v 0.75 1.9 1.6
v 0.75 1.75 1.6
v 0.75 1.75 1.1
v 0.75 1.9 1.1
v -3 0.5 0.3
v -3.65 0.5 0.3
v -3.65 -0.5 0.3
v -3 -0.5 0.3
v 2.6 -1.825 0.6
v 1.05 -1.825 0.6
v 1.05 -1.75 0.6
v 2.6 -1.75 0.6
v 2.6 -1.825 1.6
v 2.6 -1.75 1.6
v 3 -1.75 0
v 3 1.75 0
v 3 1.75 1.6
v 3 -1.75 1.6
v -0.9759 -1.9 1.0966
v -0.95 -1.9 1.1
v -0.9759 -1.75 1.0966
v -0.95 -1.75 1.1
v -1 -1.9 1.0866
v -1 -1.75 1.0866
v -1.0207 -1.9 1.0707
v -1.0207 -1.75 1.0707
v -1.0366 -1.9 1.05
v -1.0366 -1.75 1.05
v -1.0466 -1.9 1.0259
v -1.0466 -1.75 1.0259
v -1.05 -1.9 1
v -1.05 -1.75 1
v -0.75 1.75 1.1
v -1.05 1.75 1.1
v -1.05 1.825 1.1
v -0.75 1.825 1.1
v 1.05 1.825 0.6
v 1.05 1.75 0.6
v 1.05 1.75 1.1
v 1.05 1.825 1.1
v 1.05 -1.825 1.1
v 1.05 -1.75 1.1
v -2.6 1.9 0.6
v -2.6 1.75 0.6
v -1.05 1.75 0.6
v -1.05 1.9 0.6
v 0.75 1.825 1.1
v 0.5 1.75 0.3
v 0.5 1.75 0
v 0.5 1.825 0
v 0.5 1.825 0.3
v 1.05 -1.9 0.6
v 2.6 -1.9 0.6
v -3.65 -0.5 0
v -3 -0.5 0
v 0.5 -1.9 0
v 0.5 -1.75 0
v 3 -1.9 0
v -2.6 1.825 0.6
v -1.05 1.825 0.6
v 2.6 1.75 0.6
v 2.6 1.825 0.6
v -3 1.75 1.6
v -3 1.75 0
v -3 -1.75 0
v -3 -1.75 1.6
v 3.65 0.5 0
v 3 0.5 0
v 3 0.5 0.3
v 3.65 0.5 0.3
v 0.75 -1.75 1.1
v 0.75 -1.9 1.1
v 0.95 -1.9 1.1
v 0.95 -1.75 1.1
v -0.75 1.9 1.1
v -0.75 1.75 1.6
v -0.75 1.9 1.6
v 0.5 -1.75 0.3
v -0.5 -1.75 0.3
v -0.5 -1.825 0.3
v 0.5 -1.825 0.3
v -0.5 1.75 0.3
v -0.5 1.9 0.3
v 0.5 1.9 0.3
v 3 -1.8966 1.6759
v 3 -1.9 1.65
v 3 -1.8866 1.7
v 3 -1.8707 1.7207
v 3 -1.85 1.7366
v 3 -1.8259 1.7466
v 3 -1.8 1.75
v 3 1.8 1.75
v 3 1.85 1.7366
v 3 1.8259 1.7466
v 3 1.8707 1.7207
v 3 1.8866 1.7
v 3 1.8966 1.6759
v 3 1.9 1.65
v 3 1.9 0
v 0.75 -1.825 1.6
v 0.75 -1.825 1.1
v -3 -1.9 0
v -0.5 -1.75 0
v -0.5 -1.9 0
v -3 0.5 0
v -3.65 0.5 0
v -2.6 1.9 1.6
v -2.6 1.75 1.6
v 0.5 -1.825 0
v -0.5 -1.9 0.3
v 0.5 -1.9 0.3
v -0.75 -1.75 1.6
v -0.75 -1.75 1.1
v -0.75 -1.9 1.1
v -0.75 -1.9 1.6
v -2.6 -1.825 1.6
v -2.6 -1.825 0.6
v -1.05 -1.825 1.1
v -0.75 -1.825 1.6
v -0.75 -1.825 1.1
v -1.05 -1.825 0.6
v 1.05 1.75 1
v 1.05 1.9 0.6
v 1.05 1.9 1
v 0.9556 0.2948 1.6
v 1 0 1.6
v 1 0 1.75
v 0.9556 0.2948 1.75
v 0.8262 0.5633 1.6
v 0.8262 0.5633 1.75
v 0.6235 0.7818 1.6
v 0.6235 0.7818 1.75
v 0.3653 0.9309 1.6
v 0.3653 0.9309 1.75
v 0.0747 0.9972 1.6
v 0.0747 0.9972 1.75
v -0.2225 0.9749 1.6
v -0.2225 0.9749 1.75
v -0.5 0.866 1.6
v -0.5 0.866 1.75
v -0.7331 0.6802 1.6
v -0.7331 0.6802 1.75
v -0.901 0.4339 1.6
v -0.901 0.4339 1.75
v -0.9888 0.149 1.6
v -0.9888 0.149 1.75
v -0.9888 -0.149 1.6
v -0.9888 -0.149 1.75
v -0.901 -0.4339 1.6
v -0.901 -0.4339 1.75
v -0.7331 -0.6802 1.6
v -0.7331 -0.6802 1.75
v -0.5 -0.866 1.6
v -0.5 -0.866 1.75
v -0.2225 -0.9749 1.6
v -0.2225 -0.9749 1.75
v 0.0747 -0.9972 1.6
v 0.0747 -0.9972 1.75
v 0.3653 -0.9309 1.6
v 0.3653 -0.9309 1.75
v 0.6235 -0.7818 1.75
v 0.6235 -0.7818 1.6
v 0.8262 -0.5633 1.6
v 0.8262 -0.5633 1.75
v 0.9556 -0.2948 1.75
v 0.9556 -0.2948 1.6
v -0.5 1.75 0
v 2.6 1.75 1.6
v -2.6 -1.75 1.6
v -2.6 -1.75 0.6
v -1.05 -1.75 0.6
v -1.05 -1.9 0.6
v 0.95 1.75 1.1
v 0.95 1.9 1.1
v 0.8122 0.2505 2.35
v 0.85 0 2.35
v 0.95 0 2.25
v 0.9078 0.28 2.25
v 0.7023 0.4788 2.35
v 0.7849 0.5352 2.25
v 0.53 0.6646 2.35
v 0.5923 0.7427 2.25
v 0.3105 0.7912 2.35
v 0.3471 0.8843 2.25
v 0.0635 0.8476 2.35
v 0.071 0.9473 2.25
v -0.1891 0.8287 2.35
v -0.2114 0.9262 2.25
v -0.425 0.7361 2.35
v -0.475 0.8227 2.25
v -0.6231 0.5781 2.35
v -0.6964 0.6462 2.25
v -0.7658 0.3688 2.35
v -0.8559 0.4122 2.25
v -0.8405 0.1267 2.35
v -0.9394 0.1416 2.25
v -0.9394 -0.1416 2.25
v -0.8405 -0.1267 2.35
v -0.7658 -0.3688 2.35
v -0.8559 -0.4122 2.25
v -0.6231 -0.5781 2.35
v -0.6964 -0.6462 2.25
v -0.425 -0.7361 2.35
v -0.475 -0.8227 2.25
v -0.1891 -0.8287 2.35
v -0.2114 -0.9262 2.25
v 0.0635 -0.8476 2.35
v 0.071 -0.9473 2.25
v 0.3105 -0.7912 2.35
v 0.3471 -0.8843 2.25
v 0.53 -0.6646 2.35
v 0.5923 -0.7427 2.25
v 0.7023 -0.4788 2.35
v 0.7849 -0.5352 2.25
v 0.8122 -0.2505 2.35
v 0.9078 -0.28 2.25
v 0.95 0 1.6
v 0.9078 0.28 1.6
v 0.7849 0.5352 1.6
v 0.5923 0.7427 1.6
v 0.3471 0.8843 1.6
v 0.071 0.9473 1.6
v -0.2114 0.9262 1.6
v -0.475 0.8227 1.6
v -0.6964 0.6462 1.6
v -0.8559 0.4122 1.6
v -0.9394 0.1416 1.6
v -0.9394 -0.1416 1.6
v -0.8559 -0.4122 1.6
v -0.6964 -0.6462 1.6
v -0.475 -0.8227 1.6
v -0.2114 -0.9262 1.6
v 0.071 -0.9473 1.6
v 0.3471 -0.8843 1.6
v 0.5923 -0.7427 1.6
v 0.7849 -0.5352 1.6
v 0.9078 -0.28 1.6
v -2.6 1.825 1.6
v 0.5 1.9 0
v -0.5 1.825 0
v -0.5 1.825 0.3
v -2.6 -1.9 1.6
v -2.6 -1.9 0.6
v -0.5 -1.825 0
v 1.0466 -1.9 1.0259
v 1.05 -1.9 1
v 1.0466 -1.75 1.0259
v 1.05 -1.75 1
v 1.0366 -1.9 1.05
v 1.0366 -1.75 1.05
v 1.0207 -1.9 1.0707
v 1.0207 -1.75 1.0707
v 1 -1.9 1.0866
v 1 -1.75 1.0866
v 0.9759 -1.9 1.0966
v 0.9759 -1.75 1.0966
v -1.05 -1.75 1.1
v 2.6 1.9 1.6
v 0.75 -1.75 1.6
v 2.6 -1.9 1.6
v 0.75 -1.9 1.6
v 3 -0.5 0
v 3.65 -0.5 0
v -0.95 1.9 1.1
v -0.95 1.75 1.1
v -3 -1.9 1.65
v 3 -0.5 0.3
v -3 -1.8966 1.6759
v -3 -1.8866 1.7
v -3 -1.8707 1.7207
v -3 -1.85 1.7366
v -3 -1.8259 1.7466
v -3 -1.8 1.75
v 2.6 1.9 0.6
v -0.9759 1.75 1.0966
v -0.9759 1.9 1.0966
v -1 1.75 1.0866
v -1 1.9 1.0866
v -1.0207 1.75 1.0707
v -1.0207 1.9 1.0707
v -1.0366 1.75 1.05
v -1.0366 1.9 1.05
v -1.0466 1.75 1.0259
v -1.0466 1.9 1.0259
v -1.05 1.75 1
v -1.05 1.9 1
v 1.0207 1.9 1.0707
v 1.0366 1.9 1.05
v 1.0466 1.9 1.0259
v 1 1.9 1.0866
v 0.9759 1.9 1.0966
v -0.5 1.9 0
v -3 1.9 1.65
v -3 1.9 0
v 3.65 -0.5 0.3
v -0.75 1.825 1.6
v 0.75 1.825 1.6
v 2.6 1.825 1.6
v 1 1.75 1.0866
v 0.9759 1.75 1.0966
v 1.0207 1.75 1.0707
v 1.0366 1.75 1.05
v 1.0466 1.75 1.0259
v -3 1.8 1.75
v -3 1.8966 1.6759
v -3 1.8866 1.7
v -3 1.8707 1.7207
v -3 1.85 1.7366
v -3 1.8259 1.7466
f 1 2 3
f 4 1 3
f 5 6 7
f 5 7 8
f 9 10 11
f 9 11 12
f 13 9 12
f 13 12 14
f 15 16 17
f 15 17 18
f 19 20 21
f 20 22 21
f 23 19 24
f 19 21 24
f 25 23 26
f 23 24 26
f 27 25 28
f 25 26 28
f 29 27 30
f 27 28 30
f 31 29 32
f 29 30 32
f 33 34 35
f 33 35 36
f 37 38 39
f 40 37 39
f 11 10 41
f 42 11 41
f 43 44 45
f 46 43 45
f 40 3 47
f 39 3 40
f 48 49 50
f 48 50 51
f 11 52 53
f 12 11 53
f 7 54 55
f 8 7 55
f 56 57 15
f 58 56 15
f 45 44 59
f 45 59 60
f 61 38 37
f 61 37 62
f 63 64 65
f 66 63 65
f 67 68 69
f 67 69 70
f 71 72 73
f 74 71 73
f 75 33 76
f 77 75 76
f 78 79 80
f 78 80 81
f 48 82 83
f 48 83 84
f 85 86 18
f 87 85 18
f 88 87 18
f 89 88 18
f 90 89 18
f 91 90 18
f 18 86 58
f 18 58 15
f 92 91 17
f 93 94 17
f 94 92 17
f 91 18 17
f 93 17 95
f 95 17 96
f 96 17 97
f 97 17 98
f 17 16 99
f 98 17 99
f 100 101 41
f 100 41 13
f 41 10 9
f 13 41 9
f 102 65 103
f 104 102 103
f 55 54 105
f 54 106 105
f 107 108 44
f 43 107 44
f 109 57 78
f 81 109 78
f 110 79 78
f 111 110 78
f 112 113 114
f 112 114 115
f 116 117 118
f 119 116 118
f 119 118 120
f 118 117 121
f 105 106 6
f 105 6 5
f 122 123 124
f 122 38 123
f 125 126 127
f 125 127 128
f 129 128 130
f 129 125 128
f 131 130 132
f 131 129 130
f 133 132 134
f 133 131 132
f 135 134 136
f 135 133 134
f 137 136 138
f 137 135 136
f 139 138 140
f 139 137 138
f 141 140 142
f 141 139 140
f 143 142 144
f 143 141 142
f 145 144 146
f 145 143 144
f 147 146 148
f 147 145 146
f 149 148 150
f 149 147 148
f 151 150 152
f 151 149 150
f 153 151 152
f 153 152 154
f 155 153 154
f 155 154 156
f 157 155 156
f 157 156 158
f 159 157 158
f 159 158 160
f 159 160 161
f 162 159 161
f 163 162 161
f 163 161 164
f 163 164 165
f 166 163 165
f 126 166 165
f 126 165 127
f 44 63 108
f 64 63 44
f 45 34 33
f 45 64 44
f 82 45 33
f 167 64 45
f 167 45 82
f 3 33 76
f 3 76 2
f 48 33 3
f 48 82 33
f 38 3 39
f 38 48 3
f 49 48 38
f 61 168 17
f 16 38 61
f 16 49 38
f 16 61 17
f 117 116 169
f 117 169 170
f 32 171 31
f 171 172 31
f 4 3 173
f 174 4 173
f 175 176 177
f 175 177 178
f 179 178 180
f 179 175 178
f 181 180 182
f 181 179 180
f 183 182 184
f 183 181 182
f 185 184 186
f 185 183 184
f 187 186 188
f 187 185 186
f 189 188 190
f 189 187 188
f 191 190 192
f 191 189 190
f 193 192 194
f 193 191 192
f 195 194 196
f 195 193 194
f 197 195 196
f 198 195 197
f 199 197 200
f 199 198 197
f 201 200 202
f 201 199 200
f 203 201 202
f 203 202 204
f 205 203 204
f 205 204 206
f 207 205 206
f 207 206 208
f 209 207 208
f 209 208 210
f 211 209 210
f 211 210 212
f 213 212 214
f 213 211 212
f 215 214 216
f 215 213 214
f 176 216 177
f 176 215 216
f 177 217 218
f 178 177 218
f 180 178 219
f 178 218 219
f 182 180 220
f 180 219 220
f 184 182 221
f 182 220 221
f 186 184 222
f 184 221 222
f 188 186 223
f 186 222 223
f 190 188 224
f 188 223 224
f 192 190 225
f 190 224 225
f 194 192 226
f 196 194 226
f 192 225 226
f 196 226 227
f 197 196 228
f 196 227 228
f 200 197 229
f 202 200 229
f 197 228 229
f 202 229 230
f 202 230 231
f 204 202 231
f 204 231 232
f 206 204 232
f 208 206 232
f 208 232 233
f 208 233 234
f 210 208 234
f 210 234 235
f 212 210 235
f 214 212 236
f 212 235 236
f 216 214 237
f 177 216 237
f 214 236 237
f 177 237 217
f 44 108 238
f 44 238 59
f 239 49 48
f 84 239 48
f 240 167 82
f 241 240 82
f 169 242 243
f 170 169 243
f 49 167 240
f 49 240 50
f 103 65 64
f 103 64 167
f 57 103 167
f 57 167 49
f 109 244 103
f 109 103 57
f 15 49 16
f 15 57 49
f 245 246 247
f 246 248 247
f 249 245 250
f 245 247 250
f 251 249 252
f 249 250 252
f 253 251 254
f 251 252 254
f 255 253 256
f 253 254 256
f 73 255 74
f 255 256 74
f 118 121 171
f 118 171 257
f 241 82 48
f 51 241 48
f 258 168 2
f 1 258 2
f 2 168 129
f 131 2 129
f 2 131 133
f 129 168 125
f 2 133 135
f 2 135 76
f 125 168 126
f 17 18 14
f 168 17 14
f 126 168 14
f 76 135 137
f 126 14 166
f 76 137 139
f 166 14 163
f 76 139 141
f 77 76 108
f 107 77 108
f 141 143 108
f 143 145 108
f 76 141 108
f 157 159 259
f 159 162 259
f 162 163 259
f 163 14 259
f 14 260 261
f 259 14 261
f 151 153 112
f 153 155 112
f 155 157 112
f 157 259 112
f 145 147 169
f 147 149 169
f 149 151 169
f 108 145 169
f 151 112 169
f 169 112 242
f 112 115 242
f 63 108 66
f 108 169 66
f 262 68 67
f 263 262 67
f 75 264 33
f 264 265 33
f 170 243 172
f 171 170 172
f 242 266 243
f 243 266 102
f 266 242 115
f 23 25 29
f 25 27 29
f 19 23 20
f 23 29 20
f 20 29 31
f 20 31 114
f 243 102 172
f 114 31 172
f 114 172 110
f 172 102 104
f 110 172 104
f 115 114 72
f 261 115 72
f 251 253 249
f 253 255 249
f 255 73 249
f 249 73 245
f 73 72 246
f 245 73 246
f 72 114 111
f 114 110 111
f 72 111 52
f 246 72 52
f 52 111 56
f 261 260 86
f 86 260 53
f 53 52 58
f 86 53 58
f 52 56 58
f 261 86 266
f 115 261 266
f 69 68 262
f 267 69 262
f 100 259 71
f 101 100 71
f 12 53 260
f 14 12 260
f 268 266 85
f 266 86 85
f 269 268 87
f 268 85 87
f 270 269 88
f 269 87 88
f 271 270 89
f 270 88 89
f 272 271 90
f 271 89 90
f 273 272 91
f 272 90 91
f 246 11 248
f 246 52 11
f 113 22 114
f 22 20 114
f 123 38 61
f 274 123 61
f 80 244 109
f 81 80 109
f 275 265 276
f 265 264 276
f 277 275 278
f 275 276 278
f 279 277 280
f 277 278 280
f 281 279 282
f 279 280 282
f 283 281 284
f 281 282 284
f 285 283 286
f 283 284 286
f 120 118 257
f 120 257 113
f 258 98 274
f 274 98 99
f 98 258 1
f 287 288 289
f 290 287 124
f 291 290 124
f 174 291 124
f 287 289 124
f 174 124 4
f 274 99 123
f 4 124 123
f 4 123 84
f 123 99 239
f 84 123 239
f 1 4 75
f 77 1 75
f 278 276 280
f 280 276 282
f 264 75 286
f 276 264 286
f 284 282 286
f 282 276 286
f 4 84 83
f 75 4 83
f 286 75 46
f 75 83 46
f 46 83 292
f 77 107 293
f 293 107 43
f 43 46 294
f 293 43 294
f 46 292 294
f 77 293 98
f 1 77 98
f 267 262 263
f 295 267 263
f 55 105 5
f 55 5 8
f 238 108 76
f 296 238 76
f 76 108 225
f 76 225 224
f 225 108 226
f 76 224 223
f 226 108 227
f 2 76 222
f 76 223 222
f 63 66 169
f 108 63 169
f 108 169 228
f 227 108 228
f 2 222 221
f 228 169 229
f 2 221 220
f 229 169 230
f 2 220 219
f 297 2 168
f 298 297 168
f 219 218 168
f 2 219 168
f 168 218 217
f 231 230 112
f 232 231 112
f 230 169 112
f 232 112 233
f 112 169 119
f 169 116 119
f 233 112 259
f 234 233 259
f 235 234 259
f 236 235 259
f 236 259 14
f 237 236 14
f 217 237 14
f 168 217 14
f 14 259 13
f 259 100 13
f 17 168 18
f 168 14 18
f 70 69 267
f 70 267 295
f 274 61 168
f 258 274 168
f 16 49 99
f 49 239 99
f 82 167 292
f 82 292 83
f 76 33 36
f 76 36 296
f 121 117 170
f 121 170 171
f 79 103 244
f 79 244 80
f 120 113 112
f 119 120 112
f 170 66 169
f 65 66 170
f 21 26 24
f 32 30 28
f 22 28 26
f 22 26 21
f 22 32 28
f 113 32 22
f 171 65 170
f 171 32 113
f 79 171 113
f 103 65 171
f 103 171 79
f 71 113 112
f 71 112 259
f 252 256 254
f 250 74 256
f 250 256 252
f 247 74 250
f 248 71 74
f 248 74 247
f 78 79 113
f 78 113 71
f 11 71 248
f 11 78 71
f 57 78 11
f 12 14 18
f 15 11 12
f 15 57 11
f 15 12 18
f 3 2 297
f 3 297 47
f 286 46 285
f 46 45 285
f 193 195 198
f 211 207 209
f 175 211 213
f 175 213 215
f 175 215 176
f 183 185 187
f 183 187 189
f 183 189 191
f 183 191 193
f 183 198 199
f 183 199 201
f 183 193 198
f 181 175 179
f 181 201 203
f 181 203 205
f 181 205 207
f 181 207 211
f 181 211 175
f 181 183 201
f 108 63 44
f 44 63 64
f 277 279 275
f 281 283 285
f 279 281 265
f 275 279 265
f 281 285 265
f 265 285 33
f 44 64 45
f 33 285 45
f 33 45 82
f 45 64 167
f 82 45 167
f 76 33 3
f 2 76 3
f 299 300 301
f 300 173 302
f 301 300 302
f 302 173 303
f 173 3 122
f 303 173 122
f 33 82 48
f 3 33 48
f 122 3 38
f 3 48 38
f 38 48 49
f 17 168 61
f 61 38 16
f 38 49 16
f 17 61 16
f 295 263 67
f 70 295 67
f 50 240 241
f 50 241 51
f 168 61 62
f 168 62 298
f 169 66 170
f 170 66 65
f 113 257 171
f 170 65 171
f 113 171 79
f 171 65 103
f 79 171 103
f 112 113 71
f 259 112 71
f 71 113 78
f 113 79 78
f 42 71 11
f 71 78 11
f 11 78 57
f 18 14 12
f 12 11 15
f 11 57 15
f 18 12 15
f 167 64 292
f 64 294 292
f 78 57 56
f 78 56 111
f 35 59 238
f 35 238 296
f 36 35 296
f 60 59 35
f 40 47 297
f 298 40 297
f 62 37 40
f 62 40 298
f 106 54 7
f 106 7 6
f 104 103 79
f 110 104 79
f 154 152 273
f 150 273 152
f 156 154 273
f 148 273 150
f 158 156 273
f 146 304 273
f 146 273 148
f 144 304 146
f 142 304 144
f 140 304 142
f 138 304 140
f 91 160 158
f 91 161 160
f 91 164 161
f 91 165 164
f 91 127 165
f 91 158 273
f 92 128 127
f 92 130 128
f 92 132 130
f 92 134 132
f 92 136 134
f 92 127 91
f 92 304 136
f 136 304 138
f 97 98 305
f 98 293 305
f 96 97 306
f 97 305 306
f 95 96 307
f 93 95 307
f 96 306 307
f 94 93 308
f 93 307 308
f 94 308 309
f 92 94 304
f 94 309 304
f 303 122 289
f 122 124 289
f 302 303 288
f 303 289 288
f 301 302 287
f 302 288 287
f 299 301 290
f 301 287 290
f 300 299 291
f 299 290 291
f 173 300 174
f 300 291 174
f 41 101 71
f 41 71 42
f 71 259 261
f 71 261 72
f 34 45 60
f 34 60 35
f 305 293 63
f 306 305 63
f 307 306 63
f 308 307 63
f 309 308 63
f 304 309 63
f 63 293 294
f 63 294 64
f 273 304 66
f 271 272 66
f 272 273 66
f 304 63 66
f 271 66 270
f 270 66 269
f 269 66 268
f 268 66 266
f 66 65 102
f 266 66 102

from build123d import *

# Parameters (mm, degrees)
F0_R          = 1
F1_DEPTH      = 1.75
F0_W          = 0.65
F0_H          = 1
F2_DEPTH      = 0.3
F3_W          = 1.55
F3_H          = 0.5
F3_W_2        = 1
F3_H_2        = 0.3
F4_DEPTH      = 1.901
F4_DEPTH_BACK = 1.901
F5_W          = 6
F5_H          = 3.5
F6_DEPTH      = 1.6
F7_W          = 6
F7_H          = 3.65
F8_DEPTH      = 1.6
F10_R         = 0.95
F11_DEPTH     = 0.75
F12_R         = 0.1
F13_SIZE      = 0.1


with BuildPart() as f1:
    # F0 (on Top) → F1 (new body)
    with BuildSketch(Plane.XY):
        Polygon((3, 1.9), (-3, 1.9), (-3, 0.5), (-3, -0.5), (-3, -1.9), (3, -1.9), (3, -0.5), (3, 0.5), align=None)
        Circle(F0_R, mode=Mode.SUBTRACT)
    extrude(amount=F1_DEPTH)

    # F0 (on Top) → F2 (join)
    with BuildSketch(Plane.XY):
        with Locations((-3.325, 0)):
            Rectangle(F0_W, F0_H)
        with Locations((3.325, 0)):
            Rectangle(F0_W, F0_H)
    extrude(amount=F2_DEPTH)

    # F3 (on Front) → F4 (cut, two sides)
    with BuildSketch(Plane.XZ) as f4_sk:
        Polygon((-0.75, 1.6), (-2.6, 1.6), (-2.6, 1.1), (-1.05, 1.1), (-0.75, 1.1), align=None)
        with Locations((-1.825, 0.85)):
            Rectangle(F3_W, F3_H)
        with Locations((1.825, 0.85)):
            Rectangle(F3_W, F3_H)
        Polygon((1.05, 1.1), (2.6, 1.1), (2.6, 1.6), (0.75, 1.6), (0.75, 1.1), align=None)
        with Locations((0, 0.15)):
            Rectangle(F3_W_2, F3_H_2)
    extrude(amount=-F4_DEPTH, mode=Mode.SUBTRACT)
    extrude(f4_sk.sketch, amount=F4_DEPTH_BACK, mode=Mode.SUBTRACT)

    # F5 (on face) → F6 (cut)
    with BuildSketch(Plane(origin=(0, 0, 0), x_dir=(1, 0, 0), z_dir=(0, 0, -1))):
        Rectangle(F5_W, F5_H)
    extrude(amount=-F6_DEPTH, mode=Mode.SUBTRACT)


with BuildPart() as f8:
    # F7 (on face) → F8 (new body)
    with BuildSketch(Plane(origin=(0, 0, 0), x_dir=(1, 0, 0), z_dir=(0, 0, -1))):
        Rectangle(F7_W, F7_H)
    extrude(amount=-F8_DEPTH)

    # F9: cut F1
    add(f1.part, mode=Mode.SUBTRACT)

    # F10 (on face) → F11 (join)
    with BuildSketch(Plane.XY.offset(1.6)):
        Circle(F10_R)
    extrude(amount=F11_DEPTH)

    # F13
    f13_edges = [f8.edges().sort_by_distance(p)[0] for p in [
        (-0.95, 0, 2.35),
    ]]
    chamfer(f13_edges, length=F13_SIZE)


with BuildPart() as f1_1:
    add(f1.part)

    # F12
    f12_edges = [f1_1.edges().sort_by_distance(p)[0] for p in [
        (0, -1.9, 1.75),
        (0, 1.9, 1.75),
        (-1.05, -1.825, 1.1),
        (1.05, -1.825, 1.1),
        (-1.05, 1.825, 1.1),
        (1.05, 1.825, 1.1),
    ]]
    fillet(f12_edges, radius=F12_R)


solid = Compound([f8.part, f1_1.part])
